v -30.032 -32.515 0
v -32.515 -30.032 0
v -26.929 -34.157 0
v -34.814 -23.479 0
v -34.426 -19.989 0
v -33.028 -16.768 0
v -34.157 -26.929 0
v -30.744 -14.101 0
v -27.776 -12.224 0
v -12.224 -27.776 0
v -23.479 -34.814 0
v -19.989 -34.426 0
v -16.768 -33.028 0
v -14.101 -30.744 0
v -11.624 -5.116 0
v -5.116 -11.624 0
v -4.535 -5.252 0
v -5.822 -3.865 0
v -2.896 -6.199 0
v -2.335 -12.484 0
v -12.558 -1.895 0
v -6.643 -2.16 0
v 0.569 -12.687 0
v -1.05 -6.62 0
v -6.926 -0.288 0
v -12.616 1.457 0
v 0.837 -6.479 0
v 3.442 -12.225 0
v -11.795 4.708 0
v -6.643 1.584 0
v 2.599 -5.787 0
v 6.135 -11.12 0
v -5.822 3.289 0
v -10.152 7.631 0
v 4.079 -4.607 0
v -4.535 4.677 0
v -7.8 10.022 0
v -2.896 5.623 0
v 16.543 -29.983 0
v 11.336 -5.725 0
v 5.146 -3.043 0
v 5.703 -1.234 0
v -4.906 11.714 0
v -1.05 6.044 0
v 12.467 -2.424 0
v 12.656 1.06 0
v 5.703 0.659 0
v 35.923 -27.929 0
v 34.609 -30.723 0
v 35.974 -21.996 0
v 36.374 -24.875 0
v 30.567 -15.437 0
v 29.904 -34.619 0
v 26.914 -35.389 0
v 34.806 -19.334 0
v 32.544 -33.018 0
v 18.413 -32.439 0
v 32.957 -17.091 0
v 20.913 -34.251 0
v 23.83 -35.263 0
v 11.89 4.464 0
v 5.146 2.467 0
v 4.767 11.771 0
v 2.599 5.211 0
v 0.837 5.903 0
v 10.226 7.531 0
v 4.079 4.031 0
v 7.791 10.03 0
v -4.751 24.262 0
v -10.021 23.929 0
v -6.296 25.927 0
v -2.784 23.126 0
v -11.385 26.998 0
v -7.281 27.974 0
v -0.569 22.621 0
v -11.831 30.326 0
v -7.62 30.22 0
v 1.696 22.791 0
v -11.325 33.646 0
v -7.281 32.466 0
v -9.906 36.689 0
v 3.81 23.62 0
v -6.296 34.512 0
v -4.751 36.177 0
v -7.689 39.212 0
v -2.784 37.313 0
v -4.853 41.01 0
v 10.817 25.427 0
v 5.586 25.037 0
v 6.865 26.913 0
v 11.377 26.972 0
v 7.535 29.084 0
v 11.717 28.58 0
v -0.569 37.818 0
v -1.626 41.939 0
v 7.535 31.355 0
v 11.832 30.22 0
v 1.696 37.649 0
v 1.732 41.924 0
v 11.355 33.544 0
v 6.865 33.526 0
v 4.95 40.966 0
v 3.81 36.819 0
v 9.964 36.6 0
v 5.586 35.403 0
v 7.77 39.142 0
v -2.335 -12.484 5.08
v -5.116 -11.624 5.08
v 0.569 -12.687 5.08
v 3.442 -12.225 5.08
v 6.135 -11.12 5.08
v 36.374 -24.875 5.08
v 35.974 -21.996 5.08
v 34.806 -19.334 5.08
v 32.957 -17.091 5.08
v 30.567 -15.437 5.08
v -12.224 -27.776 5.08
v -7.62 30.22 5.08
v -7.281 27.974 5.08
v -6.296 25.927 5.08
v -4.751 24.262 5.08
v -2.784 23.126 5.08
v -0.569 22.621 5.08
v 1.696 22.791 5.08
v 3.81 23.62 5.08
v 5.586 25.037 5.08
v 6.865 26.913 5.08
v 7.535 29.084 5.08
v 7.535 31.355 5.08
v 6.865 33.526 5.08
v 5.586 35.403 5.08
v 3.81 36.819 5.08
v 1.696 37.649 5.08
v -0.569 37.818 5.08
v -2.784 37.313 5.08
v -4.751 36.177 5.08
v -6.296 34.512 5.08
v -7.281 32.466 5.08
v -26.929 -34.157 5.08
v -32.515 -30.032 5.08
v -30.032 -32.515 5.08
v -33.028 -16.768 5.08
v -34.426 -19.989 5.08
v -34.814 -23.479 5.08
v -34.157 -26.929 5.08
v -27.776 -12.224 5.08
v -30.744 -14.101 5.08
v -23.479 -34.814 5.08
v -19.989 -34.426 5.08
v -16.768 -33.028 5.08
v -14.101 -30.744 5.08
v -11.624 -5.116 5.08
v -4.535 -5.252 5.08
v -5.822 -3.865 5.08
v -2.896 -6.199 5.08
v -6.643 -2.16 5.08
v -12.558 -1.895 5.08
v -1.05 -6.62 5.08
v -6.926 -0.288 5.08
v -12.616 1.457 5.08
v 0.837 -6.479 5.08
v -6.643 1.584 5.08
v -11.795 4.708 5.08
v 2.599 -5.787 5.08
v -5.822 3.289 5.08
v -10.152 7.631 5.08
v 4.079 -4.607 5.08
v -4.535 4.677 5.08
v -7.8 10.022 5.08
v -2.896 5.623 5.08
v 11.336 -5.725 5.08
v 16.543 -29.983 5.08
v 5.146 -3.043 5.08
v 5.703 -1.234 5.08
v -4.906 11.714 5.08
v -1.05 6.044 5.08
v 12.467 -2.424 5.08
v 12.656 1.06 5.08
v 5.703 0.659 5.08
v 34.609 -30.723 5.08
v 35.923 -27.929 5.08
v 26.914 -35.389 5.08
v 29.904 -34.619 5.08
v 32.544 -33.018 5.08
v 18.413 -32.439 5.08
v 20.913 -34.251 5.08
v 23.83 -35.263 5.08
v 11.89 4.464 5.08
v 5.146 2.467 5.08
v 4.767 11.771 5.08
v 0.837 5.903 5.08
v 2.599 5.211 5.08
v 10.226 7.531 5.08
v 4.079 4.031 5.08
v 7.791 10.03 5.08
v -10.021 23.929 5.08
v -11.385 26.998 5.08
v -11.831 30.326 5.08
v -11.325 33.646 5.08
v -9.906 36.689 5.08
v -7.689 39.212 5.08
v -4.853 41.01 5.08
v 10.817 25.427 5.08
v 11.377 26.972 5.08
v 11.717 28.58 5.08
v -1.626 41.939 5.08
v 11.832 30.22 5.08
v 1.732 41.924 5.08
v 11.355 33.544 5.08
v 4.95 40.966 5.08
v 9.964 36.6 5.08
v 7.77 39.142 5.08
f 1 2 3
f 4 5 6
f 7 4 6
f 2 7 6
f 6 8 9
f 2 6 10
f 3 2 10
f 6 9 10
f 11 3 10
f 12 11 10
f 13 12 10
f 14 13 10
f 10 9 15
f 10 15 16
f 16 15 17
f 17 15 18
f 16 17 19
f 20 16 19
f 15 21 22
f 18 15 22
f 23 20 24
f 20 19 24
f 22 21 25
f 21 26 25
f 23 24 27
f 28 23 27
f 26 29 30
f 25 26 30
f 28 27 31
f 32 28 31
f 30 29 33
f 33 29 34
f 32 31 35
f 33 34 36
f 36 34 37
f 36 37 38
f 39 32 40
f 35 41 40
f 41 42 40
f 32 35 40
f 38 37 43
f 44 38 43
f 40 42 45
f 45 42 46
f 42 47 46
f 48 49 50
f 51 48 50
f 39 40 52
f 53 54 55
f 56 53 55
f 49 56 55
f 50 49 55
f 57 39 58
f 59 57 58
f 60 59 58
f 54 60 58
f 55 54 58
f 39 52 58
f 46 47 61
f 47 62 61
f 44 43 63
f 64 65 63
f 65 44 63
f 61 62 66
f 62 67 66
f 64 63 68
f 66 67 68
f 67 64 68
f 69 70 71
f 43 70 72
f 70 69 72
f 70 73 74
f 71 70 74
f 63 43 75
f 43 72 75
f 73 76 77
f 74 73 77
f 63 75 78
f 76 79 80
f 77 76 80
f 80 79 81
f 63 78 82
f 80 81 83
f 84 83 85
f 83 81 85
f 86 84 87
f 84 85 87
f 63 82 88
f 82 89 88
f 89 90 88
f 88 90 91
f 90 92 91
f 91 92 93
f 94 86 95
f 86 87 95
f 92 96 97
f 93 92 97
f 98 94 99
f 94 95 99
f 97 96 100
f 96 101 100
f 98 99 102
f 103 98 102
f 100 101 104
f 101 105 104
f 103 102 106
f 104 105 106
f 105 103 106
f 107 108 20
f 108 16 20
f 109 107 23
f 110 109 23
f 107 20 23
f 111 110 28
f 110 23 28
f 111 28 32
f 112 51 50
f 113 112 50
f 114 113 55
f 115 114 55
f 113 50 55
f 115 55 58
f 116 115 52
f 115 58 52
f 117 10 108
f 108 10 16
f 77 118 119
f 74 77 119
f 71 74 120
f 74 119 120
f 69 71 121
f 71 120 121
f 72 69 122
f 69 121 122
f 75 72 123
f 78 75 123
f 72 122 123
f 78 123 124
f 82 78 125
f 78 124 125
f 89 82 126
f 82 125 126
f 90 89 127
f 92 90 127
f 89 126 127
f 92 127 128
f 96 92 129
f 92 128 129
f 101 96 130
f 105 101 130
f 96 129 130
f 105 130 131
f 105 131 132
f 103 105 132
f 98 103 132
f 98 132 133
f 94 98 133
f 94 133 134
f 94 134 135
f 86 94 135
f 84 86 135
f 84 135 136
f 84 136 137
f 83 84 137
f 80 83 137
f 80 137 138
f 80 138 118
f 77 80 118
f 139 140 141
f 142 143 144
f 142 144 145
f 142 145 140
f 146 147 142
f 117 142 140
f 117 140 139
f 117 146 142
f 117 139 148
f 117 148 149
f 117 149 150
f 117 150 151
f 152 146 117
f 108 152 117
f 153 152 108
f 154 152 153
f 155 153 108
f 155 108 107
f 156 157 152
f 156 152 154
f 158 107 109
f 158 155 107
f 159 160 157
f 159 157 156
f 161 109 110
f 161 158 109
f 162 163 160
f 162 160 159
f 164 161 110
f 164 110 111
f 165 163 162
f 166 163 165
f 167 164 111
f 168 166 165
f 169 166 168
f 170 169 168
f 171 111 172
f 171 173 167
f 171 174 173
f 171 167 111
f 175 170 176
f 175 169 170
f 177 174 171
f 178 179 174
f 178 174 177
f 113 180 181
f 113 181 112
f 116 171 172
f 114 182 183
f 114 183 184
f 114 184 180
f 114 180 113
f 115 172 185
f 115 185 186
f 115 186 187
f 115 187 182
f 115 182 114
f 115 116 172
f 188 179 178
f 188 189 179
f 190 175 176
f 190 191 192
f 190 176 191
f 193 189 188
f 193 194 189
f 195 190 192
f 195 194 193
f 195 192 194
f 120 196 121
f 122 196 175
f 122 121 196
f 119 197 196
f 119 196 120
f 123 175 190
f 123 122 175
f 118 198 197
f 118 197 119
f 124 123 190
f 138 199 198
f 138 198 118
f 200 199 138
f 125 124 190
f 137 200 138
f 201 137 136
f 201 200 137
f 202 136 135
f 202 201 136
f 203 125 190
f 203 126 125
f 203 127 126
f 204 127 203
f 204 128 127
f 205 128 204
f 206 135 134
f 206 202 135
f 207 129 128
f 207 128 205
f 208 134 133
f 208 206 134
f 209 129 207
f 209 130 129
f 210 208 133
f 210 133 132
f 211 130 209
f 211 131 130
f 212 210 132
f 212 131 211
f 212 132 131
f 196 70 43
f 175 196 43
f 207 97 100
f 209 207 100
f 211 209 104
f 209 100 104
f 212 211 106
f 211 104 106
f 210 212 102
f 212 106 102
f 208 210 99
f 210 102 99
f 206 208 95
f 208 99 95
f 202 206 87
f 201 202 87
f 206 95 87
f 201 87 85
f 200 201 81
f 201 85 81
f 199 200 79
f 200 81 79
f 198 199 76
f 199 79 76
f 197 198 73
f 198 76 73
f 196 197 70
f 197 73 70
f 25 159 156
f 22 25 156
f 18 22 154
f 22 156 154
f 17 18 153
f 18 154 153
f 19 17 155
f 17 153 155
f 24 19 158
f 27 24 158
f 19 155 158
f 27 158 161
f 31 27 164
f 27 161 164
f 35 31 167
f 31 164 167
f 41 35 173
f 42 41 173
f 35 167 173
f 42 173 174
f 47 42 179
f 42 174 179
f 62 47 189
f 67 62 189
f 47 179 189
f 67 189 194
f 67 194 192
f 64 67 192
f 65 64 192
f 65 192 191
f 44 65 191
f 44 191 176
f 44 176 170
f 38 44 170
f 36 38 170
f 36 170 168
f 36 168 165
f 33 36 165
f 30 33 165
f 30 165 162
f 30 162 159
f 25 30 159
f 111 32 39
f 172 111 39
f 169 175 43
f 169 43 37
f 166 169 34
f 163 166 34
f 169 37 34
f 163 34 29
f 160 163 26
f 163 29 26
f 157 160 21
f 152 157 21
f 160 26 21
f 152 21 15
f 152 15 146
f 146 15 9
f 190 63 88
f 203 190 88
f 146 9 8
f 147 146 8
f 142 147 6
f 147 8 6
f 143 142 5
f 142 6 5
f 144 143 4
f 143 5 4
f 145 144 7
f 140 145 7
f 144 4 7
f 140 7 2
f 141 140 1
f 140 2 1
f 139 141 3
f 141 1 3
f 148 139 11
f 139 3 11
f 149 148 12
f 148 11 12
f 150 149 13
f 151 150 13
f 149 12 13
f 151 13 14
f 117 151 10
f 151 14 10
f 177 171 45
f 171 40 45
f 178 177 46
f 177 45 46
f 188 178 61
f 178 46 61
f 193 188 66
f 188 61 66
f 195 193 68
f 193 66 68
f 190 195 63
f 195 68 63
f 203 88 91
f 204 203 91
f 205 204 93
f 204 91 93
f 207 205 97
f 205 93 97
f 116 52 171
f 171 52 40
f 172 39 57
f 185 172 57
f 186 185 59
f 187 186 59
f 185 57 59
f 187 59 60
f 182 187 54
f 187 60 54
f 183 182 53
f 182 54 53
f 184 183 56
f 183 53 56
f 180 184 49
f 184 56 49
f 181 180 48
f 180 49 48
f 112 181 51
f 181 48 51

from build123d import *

# Parameters (mm, degrees)
F0_R     = 12.7
F1_DEPTH = 5.08
F3_DEPTH = 5.08
F5_DEPTH = 5.08
F7_DEPTH = 5.08
F8_D     = 15.24
F9_D     = 12.7


with BuildPart() as f1:
    # F0 (on Top) → F1 (new body)
    with BuildSketch(Plane.XY):
        Circle(F0_R)
    extrude(amount=F1_DEPTH)

    # F2 (on Top) → F3 (join)
    with BuildSketch(Plane.XY):
        with BuildLine():
            ThreePointArc((10.8174087007, 25.4269018523), (11.5752623309, 27.7701892875), (11.8315821556, 30.2196051925))
            ThreePointArc((11.8315821556, 30.2196051925), (-3.2728076401, 41.5895245615), (-10.0209587397, 23.9293967507))
            ThreePointArc((-10.0209587397, 23.9293967507), (0.8480645715, 18.4184559779), (10.8174087007, 25.4269018523))
        make_face()
        with BuildLine():
            ThreePointArc((10.8174087007, 25.4269018523), (0.8480645715, 18.4184559779), (-10.0209587397, 23.9293967507))
            Line((-10.0209587397, 23.9293967507), (-0.217736535, 0.5199406632))
            Line((-0.217736535, 0.5199406632), (10.8174087007, 25.4269018523))
        make_face()
    extrude(amount=F3_DEPTH)

    # F4 (on Top) → F5 (join)
    with BuildSketch(Plane.XY):
        with BuildLine():
            ThreePointArc((-12.2244191743, -27.7763577499), (-11.4774353607, -25.4519749313), (-11.2248354851, -23.0236146599))
            ThreePointArc((-11.2248354851, -23.0236146599), (-16.5763429957, -13.1421229656), (-27.7763577499, -12.2244191743))
            ThreePointArc((-27.7763577499, -12.2244191743), (-31.3666114242, -31.3666114242), (-12.2244191743, -27.7763577499))
        make_face()
        with BuildLine():
            ThreePointArc((-27.7763577499, -12.2244191743), (-16.5763429957, -13.1421229656), (-11.2248354851, -23.0236146599))
            ThreePointArc((-11.2248354851, -23.0236146599), (-11.4774353607, -25.4519749313), (-12.2244191743, -27.7763577499))
            Line((-12.2244191743, -27.7763577499), (0, 0))
            Line((0, 0), (-27.7763577499, -12.2244191743))
        make_face()
    extrude(amount=F5_DEPTH)

    # F6 (on Top) → F7 (join)
    with BuildSketch(Plane.XY):
        with BuildLine():
            ThreePointArc((16.5425266567, -29.9826324727), (28.4376217504, -35.1139976634), (36.3737546099, -24.874759838))
            ThreePointArc((36.3737546099, -24.874759838), (34.8057291344, -19.3339934072), (30.5667251163, -15.4366043497))
            ThreePointArc((30.5667251163, -15.4366043497), (18.1885027261, -17.5360015638), (16.5425266567, -29.9826324727))
        make_face()
        with BuildLine():
            ThreePointArc((16.5425266567, -29.9826324727), (18.1885027261, -17.5360015638), (30.5667251163, -15.4366043497))
            Line((30.5667251163, -15.4366043497), (0, 0))
            Line((0, 0), (16.5425266567, -29.9826324727))
        make_face()
    extrude(amount=F7_DEPTH)

    # F8 (through all)
    with Locations(Plane(origin=(0, 0, 0), x_dir=(1, 0, 0), z_dir=(0, 0, -1))):
        with Locations((0, -30.2196051925)):
            Hole(F8_D / 2)

    # F9 (through all)
    with Locations(Plane(origin=(0, 0, 0), x_dir=(1, 0, 0), z_dir=(0, 0, -1))):
        with Locations((-0.5756123574, 0.2878057712)):
            Hole(F9_D / 2)


solid = f1.part
